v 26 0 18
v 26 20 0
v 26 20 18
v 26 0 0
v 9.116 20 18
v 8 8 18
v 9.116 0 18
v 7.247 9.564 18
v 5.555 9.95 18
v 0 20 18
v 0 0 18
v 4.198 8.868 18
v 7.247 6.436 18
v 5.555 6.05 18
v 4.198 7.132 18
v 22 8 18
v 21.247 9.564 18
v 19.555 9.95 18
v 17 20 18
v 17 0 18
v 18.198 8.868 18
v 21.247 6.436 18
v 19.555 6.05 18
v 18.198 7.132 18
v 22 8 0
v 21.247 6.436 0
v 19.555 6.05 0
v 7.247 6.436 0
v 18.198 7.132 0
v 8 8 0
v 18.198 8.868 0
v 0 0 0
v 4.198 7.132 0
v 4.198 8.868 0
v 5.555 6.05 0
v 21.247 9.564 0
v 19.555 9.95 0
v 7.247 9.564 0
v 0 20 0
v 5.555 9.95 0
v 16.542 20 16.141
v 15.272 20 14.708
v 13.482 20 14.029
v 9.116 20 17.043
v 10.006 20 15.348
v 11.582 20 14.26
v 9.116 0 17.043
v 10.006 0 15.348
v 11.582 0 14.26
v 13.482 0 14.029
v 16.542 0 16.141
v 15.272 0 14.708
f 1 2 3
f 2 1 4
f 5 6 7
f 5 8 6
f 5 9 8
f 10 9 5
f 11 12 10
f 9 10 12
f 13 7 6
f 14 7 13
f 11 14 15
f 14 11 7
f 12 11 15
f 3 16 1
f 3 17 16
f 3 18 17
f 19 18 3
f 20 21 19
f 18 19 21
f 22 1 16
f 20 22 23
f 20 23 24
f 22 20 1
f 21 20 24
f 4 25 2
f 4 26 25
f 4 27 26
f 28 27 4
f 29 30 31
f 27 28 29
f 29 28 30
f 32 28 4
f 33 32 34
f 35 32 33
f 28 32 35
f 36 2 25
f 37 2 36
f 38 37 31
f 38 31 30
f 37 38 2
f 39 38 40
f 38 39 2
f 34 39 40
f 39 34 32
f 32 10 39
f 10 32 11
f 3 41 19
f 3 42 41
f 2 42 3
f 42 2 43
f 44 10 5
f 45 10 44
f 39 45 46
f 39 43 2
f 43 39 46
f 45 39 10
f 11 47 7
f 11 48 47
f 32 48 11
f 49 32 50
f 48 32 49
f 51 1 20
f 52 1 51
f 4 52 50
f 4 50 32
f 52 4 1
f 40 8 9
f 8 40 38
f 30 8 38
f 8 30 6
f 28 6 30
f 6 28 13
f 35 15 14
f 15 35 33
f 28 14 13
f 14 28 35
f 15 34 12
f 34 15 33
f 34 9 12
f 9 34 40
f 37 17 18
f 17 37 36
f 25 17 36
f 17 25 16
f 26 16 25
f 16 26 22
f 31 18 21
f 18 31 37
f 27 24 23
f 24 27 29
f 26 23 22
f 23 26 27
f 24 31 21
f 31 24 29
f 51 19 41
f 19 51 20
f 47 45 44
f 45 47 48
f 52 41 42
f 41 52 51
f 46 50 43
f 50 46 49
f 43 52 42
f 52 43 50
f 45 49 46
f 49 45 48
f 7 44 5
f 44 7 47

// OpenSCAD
// 
/*
 *  Z Leadscrew Base Bar Clamp
 *  by Timothy Schmidt.
 *
 *  This program is free software; you can redistribute it and/or modify
 *  it under the terms of the GNU General Public License as published by
 *  the Free Software Foundation; either version 2 of the License, or
 *  (at your option) any later version.
 *
 *  This program is distributed in the hope that it will be useful,
 *  but WITHOUT ANY WARRANTY; without even the implied warranty of
 *  MERCHANTABILITY or FITNESS FOR A PARTICULAR PURPOSE.  See the
 *  GNU General Public License for more details.
 *
 *  You should have received a copy of the GNU General Public License
 *  along with this program; if not, write to the Free Software
 *  Foundation, Inc., 59 Temple Place, Suite 330, Boston, MA  02111-1307  USA
 *
*/

difference () {
	cube(size=[26,20,18]);
	translate(v=[6,8,-1]) cylinder(r=2,h=20);
	translate(v=[20,8,-1]) cylinder(r=2,h=20);
	rotate([90,0,0]) translate(v=[13,18,-21]) cylinder(r=4,h=22);
}
